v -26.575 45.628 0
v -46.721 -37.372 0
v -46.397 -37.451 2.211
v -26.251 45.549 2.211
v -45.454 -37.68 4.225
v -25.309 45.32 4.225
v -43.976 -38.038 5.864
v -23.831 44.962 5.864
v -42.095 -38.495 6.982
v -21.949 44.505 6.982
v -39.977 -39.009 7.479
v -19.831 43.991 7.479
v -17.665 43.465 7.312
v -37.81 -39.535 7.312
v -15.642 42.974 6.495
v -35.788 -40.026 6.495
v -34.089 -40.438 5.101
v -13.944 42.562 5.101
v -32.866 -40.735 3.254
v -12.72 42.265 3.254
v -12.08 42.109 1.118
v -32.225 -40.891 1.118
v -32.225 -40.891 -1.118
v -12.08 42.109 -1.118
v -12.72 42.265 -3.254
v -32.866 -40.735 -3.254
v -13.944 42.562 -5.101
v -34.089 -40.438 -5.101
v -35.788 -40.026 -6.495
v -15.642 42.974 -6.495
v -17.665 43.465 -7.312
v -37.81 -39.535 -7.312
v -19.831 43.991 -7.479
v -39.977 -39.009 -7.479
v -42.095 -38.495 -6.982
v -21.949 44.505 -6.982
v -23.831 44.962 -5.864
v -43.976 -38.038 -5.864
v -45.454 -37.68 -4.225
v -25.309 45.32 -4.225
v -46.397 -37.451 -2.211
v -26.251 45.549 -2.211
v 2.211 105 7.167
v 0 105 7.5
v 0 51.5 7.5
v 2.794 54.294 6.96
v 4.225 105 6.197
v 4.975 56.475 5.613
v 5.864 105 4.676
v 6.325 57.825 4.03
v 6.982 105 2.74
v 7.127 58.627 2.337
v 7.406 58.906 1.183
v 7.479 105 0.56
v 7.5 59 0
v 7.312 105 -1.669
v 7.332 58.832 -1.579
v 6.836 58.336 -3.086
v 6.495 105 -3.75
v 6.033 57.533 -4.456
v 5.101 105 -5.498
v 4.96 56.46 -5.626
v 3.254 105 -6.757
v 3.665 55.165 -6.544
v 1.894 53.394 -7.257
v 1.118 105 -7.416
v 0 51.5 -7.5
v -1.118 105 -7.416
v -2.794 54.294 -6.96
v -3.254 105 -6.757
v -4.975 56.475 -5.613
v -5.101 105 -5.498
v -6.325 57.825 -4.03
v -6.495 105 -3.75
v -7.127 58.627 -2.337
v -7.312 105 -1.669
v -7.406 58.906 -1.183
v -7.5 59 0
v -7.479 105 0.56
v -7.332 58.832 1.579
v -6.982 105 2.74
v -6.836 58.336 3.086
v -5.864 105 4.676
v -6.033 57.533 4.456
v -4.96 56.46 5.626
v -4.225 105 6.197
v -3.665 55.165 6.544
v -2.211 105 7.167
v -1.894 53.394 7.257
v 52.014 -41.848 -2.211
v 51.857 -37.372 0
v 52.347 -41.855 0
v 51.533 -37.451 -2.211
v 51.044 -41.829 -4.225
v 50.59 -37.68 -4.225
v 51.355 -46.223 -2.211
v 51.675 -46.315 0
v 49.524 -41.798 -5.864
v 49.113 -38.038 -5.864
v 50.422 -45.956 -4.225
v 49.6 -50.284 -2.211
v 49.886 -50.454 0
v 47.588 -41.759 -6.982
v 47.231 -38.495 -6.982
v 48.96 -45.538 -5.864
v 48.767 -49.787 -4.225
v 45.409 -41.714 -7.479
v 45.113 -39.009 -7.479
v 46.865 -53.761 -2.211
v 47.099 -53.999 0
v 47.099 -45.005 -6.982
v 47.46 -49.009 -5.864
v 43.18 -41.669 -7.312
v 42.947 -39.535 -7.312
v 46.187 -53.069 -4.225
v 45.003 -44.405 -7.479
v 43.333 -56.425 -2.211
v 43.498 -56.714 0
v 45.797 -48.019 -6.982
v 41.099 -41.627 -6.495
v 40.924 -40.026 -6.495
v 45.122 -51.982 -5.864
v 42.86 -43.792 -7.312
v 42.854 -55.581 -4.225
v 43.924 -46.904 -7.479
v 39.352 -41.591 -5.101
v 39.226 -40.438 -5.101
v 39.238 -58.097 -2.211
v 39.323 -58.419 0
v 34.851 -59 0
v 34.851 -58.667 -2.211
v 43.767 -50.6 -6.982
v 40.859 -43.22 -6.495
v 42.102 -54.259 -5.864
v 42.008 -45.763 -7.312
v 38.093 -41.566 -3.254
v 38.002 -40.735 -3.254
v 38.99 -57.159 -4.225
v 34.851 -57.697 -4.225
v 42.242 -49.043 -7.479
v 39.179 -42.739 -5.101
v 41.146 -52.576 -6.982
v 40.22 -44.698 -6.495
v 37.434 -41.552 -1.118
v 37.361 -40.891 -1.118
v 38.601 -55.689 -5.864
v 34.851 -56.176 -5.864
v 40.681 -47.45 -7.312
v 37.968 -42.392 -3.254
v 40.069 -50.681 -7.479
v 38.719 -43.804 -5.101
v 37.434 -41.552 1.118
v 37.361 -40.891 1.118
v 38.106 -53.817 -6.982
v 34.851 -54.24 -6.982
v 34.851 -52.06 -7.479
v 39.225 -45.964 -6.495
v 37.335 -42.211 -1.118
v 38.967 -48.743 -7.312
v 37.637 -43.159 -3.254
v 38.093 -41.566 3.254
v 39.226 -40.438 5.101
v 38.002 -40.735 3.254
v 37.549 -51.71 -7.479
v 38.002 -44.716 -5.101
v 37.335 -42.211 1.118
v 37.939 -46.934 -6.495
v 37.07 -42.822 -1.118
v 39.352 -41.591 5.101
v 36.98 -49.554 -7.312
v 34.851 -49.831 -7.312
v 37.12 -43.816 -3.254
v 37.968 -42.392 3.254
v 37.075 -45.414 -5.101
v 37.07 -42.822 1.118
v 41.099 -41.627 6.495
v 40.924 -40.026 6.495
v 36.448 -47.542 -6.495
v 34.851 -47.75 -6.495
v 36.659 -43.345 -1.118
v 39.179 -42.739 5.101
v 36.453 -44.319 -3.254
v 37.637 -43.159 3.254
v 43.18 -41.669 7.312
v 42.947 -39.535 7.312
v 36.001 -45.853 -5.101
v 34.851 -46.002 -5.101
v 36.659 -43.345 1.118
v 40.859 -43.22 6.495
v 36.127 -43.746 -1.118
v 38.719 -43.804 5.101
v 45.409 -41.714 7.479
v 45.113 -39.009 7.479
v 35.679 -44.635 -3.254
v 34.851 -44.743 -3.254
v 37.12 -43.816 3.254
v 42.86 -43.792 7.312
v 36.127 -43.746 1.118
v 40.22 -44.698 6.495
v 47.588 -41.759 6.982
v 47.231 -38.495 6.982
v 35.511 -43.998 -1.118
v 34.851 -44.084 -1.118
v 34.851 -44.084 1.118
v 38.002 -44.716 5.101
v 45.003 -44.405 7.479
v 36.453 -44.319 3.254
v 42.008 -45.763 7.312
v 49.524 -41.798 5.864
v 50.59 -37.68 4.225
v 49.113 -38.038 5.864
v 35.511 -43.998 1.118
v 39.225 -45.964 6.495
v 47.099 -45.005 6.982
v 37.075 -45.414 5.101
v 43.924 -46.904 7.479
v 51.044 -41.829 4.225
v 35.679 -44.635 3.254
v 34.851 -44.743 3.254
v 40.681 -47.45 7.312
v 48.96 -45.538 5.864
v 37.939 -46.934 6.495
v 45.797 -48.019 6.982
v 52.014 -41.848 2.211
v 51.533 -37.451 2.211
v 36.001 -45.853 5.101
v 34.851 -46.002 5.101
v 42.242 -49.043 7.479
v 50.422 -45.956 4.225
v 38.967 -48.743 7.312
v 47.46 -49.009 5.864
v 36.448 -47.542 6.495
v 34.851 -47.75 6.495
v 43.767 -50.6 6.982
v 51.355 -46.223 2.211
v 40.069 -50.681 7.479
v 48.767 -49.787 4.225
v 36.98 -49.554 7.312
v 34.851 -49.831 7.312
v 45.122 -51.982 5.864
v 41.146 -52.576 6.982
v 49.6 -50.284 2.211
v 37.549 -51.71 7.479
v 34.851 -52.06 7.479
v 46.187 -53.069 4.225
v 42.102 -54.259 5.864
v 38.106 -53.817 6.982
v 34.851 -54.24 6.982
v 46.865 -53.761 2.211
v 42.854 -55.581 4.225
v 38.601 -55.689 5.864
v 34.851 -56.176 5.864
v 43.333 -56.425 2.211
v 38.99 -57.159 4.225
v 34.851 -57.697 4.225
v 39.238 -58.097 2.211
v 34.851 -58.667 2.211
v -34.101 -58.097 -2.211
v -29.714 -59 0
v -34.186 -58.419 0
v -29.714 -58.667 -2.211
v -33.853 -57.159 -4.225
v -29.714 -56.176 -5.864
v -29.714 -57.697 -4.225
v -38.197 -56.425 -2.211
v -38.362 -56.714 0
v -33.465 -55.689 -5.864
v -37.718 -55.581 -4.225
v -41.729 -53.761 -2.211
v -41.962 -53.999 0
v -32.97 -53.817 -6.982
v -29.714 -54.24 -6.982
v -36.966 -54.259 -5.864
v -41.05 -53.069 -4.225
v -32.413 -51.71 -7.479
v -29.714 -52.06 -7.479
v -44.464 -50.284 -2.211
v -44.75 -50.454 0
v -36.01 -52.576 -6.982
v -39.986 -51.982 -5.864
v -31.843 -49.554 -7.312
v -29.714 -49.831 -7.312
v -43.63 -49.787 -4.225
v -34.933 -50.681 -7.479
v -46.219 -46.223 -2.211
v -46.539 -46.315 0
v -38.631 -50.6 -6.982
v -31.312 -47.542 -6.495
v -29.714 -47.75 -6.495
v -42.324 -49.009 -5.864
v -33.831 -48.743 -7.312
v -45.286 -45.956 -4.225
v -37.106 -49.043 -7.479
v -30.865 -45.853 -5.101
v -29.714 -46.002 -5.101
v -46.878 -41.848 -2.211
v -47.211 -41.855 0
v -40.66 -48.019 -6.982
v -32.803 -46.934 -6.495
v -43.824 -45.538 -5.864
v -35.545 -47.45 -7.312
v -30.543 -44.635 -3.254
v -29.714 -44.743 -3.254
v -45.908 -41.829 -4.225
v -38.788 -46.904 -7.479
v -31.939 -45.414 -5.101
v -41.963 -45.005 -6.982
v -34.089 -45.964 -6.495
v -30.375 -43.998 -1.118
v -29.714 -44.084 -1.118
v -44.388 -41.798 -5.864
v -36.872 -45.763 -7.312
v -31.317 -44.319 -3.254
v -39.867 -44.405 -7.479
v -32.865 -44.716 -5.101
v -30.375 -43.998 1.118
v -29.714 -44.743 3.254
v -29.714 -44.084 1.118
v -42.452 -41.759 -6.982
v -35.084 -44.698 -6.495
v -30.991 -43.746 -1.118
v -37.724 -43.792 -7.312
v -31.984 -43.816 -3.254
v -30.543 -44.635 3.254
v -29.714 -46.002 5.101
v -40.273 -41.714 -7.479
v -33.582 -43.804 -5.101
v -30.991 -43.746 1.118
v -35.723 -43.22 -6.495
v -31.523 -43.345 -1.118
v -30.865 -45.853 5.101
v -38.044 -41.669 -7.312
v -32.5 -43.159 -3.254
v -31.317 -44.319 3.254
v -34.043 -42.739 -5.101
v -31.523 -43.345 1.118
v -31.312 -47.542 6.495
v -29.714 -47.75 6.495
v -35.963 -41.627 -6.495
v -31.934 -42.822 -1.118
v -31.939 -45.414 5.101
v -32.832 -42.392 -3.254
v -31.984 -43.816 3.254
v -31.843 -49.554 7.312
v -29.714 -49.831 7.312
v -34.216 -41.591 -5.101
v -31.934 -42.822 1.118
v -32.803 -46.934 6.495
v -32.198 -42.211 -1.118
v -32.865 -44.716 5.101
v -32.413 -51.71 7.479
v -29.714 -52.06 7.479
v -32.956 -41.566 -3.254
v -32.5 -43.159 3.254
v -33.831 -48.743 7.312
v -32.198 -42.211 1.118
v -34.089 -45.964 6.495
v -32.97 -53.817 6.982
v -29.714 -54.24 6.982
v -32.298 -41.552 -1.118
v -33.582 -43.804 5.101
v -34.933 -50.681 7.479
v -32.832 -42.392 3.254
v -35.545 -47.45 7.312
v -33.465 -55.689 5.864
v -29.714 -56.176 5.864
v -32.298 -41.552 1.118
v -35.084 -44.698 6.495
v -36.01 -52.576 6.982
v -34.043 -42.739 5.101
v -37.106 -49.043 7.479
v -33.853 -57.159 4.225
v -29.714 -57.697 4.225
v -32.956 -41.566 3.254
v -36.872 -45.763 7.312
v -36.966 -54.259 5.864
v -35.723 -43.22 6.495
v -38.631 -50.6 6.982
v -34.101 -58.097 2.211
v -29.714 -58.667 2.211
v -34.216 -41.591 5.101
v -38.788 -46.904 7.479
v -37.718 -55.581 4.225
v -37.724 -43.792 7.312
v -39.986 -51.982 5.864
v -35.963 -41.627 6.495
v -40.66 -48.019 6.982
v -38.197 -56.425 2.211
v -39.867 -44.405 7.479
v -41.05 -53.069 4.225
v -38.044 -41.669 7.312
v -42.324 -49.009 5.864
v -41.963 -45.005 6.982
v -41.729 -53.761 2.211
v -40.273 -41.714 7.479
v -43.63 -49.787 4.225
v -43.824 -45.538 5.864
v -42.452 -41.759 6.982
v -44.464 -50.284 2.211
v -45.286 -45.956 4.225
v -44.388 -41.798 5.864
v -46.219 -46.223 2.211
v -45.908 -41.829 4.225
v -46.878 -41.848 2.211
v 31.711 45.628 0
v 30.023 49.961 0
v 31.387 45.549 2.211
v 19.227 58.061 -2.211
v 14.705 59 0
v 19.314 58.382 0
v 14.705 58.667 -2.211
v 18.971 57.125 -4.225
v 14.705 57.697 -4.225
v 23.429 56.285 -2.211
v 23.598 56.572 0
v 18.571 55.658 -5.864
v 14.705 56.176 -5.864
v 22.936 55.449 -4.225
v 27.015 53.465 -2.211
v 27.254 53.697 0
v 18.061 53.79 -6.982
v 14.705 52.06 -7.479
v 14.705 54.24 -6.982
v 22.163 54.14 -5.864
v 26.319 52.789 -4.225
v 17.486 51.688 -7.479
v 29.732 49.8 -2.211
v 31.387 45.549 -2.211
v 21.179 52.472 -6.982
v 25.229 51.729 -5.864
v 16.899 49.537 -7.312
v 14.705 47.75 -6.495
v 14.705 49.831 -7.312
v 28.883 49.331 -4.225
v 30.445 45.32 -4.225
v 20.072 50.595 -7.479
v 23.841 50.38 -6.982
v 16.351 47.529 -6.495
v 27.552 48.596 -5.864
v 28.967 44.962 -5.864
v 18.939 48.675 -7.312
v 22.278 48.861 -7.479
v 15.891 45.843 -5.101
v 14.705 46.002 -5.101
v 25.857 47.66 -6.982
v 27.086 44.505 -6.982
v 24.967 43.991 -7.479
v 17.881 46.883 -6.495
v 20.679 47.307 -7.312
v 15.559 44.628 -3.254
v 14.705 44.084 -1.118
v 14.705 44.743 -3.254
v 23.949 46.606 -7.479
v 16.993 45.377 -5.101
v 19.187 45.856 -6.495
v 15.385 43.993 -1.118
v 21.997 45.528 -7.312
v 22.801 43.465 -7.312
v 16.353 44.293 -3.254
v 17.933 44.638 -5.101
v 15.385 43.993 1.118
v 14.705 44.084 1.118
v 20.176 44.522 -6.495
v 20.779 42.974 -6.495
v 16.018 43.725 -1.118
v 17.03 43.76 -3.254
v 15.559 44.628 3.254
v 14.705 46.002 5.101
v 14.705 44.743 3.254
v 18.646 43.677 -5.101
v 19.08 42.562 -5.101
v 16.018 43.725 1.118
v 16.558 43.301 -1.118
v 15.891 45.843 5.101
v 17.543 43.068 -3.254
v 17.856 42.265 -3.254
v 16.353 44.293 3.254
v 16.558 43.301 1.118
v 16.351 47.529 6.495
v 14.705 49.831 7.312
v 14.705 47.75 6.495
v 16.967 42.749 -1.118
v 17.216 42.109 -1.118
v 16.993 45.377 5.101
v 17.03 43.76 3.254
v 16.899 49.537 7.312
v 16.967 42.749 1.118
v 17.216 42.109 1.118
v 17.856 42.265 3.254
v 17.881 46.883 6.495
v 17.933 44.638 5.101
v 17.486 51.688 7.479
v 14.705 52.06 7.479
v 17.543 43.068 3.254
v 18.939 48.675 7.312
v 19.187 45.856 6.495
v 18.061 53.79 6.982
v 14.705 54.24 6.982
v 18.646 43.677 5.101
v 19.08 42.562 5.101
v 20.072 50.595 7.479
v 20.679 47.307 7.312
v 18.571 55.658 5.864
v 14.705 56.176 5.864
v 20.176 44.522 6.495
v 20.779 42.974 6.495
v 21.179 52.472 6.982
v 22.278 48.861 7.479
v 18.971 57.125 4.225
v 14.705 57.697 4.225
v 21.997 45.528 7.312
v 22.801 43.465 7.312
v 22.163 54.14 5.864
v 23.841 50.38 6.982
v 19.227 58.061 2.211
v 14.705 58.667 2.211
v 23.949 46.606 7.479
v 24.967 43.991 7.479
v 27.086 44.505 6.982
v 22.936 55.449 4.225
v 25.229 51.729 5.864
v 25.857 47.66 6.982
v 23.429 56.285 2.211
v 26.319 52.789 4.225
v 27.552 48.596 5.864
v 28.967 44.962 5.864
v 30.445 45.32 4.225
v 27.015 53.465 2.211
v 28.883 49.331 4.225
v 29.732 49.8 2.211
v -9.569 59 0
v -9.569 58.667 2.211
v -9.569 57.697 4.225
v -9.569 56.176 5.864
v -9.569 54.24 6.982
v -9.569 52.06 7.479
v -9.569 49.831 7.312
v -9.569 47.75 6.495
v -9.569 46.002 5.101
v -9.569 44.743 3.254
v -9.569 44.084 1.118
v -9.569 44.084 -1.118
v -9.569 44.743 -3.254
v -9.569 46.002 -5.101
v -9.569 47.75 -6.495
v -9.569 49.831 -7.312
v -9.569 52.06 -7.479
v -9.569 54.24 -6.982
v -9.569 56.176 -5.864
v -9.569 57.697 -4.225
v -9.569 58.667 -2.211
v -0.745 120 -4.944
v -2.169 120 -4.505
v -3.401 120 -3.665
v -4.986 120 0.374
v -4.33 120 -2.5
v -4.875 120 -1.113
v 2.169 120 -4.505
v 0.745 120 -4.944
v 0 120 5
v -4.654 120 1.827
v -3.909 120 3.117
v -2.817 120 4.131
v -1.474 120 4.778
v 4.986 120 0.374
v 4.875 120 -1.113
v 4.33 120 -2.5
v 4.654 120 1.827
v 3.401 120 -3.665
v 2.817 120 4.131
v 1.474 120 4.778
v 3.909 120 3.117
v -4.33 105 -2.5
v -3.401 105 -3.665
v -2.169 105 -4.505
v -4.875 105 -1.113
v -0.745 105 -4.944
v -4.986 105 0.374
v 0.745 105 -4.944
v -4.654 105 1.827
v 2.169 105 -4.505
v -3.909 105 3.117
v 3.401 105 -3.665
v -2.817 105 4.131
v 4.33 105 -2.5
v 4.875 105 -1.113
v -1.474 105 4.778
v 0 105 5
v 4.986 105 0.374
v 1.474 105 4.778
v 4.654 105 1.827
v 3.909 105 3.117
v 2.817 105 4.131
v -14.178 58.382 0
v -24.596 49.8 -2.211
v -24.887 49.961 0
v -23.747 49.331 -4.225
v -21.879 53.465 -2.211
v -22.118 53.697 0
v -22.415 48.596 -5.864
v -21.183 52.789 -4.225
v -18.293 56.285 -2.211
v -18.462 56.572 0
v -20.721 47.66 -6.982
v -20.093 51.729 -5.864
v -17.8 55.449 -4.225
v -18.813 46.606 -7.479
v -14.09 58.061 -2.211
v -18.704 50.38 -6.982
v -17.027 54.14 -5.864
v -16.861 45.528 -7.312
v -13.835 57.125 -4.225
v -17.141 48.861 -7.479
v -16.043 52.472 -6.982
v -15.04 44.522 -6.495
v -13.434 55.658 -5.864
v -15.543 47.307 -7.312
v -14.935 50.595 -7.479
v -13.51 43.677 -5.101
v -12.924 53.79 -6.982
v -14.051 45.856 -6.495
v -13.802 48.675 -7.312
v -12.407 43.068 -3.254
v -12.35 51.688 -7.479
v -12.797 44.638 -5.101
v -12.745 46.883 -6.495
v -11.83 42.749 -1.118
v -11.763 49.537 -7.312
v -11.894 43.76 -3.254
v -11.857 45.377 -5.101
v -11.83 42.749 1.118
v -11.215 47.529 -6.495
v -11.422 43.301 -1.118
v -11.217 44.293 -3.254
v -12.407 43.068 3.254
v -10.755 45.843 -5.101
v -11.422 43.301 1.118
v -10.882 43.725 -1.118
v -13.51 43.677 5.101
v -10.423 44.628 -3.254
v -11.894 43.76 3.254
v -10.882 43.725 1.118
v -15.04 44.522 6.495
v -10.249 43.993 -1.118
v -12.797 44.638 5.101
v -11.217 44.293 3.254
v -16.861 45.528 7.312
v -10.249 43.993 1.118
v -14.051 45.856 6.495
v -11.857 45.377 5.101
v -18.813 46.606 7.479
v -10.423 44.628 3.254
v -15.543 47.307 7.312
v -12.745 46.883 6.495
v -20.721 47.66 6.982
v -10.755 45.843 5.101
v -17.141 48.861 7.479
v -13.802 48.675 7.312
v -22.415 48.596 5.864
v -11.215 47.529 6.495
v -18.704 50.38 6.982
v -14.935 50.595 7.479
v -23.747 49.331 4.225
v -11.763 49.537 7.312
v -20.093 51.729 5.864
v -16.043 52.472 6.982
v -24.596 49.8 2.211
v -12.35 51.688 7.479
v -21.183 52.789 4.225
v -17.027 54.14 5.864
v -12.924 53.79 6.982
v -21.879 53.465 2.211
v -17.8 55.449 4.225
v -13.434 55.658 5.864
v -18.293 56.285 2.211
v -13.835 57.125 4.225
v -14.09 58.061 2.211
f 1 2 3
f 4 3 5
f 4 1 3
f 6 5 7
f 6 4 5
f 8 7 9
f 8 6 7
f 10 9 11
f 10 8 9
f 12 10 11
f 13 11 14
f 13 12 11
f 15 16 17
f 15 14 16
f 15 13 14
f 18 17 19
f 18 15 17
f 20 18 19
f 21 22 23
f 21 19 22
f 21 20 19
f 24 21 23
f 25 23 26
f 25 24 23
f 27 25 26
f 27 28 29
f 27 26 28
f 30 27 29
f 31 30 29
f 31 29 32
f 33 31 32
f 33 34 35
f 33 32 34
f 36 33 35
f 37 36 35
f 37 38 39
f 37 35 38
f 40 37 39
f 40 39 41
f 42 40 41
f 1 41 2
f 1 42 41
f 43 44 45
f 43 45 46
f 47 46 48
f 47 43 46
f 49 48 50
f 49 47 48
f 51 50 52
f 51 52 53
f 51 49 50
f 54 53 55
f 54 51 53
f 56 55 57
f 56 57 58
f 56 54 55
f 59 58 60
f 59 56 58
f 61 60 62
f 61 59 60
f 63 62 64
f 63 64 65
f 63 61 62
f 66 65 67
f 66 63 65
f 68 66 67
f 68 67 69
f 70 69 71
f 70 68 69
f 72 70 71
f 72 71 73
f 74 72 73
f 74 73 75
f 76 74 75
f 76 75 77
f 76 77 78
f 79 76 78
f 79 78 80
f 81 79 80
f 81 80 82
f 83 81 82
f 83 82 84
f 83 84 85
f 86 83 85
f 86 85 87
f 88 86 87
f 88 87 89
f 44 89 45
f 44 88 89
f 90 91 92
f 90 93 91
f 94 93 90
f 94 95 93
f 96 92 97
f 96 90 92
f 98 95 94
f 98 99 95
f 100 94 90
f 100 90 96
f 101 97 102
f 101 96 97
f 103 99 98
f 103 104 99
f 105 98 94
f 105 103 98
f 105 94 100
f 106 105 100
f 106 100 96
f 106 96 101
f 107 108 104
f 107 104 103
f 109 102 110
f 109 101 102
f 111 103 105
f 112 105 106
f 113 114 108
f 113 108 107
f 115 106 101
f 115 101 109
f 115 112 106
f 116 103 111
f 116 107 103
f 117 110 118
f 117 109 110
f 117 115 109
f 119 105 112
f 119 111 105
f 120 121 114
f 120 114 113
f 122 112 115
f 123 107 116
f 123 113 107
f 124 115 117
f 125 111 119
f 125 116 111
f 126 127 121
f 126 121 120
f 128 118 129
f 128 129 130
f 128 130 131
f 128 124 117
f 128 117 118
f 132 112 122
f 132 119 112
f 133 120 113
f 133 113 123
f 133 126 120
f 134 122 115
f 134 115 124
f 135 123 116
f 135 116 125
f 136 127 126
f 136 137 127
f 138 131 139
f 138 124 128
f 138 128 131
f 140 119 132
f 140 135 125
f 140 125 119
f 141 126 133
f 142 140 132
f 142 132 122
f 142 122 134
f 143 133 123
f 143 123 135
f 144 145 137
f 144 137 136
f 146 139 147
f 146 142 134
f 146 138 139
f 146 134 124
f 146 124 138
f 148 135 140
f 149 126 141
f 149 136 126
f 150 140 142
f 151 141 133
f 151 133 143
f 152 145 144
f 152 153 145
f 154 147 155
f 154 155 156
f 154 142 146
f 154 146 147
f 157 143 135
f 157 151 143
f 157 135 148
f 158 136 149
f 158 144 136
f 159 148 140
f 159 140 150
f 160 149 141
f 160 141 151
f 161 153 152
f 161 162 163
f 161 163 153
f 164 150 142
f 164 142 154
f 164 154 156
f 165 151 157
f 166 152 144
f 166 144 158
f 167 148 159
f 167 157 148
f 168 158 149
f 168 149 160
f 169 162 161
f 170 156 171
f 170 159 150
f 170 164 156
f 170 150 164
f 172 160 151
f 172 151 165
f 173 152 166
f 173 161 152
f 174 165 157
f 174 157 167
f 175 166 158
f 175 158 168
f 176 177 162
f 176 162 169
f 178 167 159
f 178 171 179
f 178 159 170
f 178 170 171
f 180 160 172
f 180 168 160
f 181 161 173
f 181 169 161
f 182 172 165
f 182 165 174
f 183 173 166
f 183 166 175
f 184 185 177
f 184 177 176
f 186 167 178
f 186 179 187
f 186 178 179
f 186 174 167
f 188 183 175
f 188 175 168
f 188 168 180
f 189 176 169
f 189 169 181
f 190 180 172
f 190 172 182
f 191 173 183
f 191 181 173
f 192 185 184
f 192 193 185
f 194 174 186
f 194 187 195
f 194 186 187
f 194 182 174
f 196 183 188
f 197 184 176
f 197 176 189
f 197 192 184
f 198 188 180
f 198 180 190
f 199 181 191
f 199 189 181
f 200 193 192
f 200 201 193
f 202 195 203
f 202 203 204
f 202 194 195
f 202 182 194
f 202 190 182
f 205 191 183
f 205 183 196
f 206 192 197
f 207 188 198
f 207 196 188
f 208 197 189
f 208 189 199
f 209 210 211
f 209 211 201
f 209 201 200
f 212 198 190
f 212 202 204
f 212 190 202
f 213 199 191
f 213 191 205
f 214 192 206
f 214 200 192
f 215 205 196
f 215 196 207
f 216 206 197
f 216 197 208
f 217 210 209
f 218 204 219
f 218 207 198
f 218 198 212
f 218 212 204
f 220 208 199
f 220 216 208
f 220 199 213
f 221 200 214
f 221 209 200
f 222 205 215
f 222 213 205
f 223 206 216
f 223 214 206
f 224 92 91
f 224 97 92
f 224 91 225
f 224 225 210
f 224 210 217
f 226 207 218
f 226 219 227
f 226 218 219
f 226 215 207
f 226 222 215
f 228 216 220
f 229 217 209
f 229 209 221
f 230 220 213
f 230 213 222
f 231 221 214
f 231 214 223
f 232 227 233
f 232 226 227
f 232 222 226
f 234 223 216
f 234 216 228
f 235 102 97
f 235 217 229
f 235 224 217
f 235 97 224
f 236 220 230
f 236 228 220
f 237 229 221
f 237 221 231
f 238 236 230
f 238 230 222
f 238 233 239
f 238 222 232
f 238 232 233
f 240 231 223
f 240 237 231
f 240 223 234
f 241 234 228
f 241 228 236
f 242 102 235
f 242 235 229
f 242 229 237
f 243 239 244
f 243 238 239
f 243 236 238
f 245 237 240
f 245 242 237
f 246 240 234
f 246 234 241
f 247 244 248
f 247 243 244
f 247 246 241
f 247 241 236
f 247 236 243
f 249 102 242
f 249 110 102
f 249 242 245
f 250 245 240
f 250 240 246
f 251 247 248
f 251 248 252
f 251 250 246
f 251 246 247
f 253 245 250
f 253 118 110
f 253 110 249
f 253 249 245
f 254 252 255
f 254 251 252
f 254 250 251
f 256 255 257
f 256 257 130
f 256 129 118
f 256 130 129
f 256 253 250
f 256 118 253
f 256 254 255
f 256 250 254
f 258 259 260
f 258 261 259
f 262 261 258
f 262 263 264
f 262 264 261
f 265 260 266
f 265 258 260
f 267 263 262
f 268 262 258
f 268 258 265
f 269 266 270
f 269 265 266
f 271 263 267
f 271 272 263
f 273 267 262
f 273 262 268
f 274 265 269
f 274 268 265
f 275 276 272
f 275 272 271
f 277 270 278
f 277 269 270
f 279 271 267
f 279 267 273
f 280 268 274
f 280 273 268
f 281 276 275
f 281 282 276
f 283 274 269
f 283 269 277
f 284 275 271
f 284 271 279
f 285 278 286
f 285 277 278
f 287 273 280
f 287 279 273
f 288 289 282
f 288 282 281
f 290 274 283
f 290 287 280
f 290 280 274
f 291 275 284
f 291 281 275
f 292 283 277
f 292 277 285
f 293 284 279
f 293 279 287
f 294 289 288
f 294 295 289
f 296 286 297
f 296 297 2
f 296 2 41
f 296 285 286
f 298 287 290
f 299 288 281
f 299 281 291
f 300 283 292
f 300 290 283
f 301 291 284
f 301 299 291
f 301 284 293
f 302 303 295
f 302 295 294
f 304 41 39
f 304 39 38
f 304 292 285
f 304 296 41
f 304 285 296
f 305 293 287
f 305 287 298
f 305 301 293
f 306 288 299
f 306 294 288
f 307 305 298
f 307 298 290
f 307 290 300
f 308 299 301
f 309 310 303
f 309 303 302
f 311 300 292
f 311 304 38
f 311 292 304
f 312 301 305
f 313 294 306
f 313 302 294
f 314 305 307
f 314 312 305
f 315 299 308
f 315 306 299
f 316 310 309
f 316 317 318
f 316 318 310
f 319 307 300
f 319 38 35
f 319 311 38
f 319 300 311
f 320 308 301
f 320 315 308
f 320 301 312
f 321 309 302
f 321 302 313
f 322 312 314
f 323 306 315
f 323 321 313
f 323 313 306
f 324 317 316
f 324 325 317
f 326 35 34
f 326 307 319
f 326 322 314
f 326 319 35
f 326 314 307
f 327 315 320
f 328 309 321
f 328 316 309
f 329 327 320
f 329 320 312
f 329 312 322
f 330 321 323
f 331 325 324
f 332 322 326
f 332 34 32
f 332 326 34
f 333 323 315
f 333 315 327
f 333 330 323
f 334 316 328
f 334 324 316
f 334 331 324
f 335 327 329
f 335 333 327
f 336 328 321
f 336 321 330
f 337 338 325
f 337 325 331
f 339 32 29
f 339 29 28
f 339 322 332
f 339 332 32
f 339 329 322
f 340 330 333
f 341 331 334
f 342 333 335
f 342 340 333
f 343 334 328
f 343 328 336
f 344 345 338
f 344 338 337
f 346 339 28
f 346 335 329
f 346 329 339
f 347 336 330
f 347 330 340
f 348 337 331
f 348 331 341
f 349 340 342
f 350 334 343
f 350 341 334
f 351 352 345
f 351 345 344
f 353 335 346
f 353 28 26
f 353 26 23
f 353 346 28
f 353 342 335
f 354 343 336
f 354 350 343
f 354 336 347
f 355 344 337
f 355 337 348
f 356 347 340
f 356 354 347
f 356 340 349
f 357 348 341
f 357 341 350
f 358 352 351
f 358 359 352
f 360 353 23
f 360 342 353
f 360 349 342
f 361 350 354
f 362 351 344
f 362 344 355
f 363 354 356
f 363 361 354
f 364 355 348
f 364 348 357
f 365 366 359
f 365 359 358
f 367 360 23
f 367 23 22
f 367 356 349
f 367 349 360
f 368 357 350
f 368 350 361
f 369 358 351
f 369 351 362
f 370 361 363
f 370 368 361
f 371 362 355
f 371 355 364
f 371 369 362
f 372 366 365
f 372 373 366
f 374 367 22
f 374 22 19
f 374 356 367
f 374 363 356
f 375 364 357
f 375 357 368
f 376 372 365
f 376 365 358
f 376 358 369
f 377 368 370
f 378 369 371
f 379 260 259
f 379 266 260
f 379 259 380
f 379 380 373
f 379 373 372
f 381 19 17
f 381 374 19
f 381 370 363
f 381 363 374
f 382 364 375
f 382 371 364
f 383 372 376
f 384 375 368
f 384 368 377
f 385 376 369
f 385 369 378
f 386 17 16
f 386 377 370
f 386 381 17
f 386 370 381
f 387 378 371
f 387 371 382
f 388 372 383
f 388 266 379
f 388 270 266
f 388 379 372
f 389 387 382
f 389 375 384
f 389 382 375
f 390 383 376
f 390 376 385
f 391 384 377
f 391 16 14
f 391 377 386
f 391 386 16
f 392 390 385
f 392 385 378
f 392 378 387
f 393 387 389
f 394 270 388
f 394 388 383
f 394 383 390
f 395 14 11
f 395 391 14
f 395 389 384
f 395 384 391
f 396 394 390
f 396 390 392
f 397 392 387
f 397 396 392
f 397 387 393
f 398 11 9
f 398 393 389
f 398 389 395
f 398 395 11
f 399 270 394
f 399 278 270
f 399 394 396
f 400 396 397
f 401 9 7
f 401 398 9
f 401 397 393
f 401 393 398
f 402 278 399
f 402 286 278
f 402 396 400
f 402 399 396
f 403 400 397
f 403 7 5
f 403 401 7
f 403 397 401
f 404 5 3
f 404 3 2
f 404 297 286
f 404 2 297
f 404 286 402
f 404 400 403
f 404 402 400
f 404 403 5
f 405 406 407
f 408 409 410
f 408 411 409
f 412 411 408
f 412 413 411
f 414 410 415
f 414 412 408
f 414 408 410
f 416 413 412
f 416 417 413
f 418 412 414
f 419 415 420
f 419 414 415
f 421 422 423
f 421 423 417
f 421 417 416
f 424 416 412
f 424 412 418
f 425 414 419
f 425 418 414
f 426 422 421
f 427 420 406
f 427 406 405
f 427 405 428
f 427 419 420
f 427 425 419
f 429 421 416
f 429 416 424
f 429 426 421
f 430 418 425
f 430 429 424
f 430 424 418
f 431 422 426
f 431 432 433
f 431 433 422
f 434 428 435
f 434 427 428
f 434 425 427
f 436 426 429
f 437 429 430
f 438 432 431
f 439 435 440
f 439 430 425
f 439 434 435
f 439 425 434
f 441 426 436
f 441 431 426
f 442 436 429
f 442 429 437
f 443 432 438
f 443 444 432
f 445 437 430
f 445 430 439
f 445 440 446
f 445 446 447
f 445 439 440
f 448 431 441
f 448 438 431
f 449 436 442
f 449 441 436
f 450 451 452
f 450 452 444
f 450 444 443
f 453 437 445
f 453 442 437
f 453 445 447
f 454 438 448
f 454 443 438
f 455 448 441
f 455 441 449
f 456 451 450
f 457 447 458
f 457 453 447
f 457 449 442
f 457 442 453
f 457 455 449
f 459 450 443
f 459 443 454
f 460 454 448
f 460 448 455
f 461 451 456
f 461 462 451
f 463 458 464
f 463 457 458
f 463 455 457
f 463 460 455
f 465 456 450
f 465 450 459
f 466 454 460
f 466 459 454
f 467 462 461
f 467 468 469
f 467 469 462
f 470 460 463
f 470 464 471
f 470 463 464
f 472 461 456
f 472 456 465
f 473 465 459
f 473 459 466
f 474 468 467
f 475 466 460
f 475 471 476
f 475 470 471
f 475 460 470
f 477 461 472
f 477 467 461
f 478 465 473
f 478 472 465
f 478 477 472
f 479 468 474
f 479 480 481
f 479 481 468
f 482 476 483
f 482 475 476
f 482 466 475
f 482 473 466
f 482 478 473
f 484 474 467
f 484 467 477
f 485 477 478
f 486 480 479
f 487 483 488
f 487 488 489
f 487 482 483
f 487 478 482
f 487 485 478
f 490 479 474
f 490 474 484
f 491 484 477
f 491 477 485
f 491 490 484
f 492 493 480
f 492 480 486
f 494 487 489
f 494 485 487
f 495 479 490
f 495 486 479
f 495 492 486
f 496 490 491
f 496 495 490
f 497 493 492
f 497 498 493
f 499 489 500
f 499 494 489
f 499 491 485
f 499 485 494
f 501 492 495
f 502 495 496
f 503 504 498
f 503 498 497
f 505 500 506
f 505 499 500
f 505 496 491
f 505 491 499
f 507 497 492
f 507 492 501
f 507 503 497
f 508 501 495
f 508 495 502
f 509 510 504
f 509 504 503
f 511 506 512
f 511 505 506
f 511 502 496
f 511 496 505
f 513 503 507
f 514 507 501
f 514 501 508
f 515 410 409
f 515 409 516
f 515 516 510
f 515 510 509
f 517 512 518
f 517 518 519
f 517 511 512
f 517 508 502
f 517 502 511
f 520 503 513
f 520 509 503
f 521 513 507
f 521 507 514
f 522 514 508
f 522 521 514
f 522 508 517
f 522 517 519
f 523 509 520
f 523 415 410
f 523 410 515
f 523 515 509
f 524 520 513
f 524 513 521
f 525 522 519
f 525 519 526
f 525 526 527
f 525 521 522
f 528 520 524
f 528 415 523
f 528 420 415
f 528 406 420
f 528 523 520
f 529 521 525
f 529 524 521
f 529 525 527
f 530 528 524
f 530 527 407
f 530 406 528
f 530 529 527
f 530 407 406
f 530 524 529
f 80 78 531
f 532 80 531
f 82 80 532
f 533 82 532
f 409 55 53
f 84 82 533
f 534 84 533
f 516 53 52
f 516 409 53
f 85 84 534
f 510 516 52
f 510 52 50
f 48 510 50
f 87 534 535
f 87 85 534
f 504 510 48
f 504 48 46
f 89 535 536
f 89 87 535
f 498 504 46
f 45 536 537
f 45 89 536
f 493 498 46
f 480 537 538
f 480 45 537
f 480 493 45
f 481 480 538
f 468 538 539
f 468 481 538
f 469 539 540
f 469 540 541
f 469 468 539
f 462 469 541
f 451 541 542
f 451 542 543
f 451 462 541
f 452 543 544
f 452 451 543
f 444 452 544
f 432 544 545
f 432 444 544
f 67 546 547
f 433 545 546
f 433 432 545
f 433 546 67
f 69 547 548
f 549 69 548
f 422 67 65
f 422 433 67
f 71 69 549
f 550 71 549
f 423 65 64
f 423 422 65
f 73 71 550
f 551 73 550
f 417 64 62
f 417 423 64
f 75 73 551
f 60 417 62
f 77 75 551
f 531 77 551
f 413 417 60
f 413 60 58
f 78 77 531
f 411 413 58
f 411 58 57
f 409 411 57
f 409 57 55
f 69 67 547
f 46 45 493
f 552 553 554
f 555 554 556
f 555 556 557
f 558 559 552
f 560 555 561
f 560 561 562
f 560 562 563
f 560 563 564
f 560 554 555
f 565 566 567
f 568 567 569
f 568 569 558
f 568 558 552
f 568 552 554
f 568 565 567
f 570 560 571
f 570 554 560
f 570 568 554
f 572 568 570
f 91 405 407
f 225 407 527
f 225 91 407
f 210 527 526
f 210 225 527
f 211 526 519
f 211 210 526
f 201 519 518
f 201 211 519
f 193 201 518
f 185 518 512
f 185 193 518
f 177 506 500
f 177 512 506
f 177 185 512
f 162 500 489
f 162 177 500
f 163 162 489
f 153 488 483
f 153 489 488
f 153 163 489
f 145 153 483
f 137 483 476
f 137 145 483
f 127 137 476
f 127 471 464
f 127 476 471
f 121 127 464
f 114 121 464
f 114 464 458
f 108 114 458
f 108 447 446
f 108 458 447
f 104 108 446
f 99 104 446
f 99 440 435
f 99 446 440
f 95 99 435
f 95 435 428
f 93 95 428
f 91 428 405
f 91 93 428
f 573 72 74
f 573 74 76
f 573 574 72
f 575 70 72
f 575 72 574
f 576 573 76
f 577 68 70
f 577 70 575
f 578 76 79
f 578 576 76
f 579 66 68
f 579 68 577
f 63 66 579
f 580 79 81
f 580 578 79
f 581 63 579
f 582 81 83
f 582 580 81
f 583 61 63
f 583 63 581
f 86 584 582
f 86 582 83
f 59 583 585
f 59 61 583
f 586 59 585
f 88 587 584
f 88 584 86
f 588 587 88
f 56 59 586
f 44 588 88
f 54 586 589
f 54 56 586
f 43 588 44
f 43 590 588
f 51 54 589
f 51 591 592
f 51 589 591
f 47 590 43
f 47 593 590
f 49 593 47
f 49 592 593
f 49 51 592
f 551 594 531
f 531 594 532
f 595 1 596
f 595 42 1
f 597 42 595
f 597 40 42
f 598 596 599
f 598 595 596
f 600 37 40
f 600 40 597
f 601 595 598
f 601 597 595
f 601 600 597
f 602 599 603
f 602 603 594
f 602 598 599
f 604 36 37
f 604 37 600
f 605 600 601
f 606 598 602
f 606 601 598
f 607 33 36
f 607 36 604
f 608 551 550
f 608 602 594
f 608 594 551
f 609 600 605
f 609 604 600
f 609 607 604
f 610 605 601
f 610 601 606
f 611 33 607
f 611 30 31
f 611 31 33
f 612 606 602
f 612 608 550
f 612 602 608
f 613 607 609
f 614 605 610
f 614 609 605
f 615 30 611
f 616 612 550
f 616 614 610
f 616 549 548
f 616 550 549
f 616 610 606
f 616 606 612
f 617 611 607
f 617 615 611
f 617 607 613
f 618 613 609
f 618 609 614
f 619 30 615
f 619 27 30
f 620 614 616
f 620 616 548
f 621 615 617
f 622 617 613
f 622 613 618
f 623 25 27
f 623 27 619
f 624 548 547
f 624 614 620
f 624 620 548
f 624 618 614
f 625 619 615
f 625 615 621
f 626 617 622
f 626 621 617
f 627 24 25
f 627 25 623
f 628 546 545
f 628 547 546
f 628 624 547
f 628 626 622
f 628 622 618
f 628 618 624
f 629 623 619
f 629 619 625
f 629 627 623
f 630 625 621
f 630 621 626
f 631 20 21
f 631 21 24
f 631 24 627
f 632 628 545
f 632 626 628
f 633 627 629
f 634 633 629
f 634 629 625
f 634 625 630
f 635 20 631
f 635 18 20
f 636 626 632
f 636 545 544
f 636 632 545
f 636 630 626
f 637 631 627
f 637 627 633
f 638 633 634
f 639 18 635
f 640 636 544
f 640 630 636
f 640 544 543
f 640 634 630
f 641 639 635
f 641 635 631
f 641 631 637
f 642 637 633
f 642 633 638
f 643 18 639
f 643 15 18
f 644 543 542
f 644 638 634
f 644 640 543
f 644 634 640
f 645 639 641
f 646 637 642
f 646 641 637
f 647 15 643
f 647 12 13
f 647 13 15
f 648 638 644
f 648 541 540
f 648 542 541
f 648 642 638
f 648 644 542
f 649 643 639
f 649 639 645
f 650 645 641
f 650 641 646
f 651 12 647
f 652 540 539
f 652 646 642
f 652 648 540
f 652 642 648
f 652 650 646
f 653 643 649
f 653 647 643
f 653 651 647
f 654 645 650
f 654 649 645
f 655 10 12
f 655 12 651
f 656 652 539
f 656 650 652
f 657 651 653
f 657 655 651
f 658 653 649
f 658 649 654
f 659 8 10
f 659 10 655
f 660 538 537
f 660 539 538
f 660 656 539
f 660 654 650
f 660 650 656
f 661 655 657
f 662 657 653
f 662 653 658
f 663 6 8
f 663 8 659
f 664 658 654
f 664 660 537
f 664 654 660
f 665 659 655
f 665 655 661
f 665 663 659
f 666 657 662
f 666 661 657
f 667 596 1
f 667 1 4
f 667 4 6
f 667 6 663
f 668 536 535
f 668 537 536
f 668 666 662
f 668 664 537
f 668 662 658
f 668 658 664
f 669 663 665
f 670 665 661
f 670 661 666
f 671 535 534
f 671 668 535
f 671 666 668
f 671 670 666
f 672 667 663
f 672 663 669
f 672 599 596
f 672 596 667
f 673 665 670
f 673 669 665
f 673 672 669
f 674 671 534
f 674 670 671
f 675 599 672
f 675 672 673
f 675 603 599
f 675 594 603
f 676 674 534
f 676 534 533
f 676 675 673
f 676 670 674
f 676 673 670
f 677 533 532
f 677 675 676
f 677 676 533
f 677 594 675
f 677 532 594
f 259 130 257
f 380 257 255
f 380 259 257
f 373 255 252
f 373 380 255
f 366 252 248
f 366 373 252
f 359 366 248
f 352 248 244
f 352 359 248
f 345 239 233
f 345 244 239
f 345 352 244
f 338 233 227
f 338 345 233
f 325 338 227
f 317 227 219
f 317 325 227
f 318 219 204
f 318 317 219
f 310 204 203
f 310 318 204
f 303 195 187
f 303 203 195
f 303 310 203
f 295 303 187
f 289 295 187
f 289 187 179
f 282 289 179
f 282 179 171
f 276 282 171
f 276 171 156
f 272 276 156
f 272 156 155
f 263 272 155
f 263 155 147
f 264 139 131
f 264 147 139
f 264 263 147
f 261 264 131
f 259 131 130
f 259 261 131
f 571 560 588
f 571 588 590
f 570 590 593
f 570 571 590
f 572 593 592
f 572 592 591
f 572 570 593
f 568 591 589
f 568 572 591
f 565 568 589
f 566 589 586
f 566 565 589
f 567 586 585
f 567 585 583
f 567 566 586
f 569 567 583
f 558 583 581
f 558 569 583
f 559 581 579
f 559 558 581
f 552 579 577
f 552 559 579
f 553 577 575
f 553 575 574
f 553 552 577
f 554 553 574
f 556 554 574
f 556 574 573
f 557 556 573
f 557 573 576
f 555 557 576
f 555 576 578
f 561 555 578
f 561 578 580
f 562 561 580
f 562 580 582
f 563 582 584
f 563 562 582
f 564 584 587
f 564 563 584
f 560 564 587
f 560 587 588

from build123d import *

# Parameters (mm, degrees)
SWEEP1_PROFILE_R         = 7.5
BOSS_EXTRUDE1_REACH      = 188.649
BOSS_EXTRUDE1_END_RADIUS = 7.5
SKETCH10_R               = 7.5
SKETCH11_R               = 7.5
SKETCH11_R_2             = 5
CUT_EXTRUDE1_DEPTH       = 15


with BuildPart() as part:
    # Sweep1: sweep along a path in Sketch1
    with BuildLine(Plane.XY) as sweep1_path:
        Line((-9.568747019, 51.5), (14.70492956, 51.5))
        ThreePointArc((14.70492956, 51.5), (20.88607003, 49.360884333), (24.422775616, 43.858700499))
        Line((24.422775616, 43.858700499), (44.568406684, -39.141299501))
        ThreePointArc((44.568406684, -39.141299501), (42.711444961, -47.68114047), (34.850560628, -51.5))
        Line((34.850560628, -51.5), (-29.714378087, -51.5))
        ThreePointArc((-29.714378087, -51.5), (-37.57526242, -47.68114047), (-39.432224142, -39.141299501))
        Line((-39.432224142, -39.141299501), (-19.286593074, 43.858700499))
        ThreePointArc((-19.286593074, 43.858700499), (-15.749887488, 49.360884333), (-9.568747019, 51.5))
    # Sweep1 profile (on start of the path) → Sweep1 (sweep)
    with BuildSketch(Plane(origin=(-9.568747019, 51.5, 0), x_dir=(0, 1, 0), z_dir=(1, 0, 0))):
        Circle(SWEEP1_PROFILE_R)
    sweep(path=sweep1_path.line)

    # Boss-Extrude1: up to this cylinder (the profile starts outside it)
    boss_extrude1_end = Plane(origin=(0, 51.5, 0), z_dir=(1, 0, 0)) * Cylinder(BOSS_EXTRUDE1_END_RADIUS, 393.298, mode=Mode.PRIVATE)
    # Sketch10 → Boss-Extrude1 (add, up to the surface)
    with BuildSketch(Plane(origin=(0, 120, 0), x_dir=(1, 0, 0), z_dir=(0, 1, 0)), mode=Mode.PRIVATE) as boss_extrude1_sk1:
        with Locations(Location((0, 0, 0), (0, 0, 270))):
            Circle(SKETCH10_R)
    boss_extrude1_tool1 = extrude(boss_extrude1_sk1.sketch, amount=-BOSS_EXTRUDE1_REACH, mode=Mode.PRIVATE) - boss_extrude1_end
    add(boss_extrude1_tool1.solids().sort_by_distance((0, 120, 0))[0])

    # Sketch11 → Cut-Extrude1 (cut)
    with BuildSketch(Plane(origin=(0, 120, 0), x_dir=(1, 0, 0), z_dir=(0, 1, 0))):
        with Locations(Location((0, 0, 0), (0, 0, 270))):
            Circle(SKETCH11_R)
        with Locations(Location((0, 0, 0), (0, 0, 270))):
            Circle(SKETCH11_R_2, mode=Mode.SUBTRACT)
    extrude(amount=-CUT_EXTRUDE1_DEPTH, mode=Mode.SUBTRACT)


solid = part.part
